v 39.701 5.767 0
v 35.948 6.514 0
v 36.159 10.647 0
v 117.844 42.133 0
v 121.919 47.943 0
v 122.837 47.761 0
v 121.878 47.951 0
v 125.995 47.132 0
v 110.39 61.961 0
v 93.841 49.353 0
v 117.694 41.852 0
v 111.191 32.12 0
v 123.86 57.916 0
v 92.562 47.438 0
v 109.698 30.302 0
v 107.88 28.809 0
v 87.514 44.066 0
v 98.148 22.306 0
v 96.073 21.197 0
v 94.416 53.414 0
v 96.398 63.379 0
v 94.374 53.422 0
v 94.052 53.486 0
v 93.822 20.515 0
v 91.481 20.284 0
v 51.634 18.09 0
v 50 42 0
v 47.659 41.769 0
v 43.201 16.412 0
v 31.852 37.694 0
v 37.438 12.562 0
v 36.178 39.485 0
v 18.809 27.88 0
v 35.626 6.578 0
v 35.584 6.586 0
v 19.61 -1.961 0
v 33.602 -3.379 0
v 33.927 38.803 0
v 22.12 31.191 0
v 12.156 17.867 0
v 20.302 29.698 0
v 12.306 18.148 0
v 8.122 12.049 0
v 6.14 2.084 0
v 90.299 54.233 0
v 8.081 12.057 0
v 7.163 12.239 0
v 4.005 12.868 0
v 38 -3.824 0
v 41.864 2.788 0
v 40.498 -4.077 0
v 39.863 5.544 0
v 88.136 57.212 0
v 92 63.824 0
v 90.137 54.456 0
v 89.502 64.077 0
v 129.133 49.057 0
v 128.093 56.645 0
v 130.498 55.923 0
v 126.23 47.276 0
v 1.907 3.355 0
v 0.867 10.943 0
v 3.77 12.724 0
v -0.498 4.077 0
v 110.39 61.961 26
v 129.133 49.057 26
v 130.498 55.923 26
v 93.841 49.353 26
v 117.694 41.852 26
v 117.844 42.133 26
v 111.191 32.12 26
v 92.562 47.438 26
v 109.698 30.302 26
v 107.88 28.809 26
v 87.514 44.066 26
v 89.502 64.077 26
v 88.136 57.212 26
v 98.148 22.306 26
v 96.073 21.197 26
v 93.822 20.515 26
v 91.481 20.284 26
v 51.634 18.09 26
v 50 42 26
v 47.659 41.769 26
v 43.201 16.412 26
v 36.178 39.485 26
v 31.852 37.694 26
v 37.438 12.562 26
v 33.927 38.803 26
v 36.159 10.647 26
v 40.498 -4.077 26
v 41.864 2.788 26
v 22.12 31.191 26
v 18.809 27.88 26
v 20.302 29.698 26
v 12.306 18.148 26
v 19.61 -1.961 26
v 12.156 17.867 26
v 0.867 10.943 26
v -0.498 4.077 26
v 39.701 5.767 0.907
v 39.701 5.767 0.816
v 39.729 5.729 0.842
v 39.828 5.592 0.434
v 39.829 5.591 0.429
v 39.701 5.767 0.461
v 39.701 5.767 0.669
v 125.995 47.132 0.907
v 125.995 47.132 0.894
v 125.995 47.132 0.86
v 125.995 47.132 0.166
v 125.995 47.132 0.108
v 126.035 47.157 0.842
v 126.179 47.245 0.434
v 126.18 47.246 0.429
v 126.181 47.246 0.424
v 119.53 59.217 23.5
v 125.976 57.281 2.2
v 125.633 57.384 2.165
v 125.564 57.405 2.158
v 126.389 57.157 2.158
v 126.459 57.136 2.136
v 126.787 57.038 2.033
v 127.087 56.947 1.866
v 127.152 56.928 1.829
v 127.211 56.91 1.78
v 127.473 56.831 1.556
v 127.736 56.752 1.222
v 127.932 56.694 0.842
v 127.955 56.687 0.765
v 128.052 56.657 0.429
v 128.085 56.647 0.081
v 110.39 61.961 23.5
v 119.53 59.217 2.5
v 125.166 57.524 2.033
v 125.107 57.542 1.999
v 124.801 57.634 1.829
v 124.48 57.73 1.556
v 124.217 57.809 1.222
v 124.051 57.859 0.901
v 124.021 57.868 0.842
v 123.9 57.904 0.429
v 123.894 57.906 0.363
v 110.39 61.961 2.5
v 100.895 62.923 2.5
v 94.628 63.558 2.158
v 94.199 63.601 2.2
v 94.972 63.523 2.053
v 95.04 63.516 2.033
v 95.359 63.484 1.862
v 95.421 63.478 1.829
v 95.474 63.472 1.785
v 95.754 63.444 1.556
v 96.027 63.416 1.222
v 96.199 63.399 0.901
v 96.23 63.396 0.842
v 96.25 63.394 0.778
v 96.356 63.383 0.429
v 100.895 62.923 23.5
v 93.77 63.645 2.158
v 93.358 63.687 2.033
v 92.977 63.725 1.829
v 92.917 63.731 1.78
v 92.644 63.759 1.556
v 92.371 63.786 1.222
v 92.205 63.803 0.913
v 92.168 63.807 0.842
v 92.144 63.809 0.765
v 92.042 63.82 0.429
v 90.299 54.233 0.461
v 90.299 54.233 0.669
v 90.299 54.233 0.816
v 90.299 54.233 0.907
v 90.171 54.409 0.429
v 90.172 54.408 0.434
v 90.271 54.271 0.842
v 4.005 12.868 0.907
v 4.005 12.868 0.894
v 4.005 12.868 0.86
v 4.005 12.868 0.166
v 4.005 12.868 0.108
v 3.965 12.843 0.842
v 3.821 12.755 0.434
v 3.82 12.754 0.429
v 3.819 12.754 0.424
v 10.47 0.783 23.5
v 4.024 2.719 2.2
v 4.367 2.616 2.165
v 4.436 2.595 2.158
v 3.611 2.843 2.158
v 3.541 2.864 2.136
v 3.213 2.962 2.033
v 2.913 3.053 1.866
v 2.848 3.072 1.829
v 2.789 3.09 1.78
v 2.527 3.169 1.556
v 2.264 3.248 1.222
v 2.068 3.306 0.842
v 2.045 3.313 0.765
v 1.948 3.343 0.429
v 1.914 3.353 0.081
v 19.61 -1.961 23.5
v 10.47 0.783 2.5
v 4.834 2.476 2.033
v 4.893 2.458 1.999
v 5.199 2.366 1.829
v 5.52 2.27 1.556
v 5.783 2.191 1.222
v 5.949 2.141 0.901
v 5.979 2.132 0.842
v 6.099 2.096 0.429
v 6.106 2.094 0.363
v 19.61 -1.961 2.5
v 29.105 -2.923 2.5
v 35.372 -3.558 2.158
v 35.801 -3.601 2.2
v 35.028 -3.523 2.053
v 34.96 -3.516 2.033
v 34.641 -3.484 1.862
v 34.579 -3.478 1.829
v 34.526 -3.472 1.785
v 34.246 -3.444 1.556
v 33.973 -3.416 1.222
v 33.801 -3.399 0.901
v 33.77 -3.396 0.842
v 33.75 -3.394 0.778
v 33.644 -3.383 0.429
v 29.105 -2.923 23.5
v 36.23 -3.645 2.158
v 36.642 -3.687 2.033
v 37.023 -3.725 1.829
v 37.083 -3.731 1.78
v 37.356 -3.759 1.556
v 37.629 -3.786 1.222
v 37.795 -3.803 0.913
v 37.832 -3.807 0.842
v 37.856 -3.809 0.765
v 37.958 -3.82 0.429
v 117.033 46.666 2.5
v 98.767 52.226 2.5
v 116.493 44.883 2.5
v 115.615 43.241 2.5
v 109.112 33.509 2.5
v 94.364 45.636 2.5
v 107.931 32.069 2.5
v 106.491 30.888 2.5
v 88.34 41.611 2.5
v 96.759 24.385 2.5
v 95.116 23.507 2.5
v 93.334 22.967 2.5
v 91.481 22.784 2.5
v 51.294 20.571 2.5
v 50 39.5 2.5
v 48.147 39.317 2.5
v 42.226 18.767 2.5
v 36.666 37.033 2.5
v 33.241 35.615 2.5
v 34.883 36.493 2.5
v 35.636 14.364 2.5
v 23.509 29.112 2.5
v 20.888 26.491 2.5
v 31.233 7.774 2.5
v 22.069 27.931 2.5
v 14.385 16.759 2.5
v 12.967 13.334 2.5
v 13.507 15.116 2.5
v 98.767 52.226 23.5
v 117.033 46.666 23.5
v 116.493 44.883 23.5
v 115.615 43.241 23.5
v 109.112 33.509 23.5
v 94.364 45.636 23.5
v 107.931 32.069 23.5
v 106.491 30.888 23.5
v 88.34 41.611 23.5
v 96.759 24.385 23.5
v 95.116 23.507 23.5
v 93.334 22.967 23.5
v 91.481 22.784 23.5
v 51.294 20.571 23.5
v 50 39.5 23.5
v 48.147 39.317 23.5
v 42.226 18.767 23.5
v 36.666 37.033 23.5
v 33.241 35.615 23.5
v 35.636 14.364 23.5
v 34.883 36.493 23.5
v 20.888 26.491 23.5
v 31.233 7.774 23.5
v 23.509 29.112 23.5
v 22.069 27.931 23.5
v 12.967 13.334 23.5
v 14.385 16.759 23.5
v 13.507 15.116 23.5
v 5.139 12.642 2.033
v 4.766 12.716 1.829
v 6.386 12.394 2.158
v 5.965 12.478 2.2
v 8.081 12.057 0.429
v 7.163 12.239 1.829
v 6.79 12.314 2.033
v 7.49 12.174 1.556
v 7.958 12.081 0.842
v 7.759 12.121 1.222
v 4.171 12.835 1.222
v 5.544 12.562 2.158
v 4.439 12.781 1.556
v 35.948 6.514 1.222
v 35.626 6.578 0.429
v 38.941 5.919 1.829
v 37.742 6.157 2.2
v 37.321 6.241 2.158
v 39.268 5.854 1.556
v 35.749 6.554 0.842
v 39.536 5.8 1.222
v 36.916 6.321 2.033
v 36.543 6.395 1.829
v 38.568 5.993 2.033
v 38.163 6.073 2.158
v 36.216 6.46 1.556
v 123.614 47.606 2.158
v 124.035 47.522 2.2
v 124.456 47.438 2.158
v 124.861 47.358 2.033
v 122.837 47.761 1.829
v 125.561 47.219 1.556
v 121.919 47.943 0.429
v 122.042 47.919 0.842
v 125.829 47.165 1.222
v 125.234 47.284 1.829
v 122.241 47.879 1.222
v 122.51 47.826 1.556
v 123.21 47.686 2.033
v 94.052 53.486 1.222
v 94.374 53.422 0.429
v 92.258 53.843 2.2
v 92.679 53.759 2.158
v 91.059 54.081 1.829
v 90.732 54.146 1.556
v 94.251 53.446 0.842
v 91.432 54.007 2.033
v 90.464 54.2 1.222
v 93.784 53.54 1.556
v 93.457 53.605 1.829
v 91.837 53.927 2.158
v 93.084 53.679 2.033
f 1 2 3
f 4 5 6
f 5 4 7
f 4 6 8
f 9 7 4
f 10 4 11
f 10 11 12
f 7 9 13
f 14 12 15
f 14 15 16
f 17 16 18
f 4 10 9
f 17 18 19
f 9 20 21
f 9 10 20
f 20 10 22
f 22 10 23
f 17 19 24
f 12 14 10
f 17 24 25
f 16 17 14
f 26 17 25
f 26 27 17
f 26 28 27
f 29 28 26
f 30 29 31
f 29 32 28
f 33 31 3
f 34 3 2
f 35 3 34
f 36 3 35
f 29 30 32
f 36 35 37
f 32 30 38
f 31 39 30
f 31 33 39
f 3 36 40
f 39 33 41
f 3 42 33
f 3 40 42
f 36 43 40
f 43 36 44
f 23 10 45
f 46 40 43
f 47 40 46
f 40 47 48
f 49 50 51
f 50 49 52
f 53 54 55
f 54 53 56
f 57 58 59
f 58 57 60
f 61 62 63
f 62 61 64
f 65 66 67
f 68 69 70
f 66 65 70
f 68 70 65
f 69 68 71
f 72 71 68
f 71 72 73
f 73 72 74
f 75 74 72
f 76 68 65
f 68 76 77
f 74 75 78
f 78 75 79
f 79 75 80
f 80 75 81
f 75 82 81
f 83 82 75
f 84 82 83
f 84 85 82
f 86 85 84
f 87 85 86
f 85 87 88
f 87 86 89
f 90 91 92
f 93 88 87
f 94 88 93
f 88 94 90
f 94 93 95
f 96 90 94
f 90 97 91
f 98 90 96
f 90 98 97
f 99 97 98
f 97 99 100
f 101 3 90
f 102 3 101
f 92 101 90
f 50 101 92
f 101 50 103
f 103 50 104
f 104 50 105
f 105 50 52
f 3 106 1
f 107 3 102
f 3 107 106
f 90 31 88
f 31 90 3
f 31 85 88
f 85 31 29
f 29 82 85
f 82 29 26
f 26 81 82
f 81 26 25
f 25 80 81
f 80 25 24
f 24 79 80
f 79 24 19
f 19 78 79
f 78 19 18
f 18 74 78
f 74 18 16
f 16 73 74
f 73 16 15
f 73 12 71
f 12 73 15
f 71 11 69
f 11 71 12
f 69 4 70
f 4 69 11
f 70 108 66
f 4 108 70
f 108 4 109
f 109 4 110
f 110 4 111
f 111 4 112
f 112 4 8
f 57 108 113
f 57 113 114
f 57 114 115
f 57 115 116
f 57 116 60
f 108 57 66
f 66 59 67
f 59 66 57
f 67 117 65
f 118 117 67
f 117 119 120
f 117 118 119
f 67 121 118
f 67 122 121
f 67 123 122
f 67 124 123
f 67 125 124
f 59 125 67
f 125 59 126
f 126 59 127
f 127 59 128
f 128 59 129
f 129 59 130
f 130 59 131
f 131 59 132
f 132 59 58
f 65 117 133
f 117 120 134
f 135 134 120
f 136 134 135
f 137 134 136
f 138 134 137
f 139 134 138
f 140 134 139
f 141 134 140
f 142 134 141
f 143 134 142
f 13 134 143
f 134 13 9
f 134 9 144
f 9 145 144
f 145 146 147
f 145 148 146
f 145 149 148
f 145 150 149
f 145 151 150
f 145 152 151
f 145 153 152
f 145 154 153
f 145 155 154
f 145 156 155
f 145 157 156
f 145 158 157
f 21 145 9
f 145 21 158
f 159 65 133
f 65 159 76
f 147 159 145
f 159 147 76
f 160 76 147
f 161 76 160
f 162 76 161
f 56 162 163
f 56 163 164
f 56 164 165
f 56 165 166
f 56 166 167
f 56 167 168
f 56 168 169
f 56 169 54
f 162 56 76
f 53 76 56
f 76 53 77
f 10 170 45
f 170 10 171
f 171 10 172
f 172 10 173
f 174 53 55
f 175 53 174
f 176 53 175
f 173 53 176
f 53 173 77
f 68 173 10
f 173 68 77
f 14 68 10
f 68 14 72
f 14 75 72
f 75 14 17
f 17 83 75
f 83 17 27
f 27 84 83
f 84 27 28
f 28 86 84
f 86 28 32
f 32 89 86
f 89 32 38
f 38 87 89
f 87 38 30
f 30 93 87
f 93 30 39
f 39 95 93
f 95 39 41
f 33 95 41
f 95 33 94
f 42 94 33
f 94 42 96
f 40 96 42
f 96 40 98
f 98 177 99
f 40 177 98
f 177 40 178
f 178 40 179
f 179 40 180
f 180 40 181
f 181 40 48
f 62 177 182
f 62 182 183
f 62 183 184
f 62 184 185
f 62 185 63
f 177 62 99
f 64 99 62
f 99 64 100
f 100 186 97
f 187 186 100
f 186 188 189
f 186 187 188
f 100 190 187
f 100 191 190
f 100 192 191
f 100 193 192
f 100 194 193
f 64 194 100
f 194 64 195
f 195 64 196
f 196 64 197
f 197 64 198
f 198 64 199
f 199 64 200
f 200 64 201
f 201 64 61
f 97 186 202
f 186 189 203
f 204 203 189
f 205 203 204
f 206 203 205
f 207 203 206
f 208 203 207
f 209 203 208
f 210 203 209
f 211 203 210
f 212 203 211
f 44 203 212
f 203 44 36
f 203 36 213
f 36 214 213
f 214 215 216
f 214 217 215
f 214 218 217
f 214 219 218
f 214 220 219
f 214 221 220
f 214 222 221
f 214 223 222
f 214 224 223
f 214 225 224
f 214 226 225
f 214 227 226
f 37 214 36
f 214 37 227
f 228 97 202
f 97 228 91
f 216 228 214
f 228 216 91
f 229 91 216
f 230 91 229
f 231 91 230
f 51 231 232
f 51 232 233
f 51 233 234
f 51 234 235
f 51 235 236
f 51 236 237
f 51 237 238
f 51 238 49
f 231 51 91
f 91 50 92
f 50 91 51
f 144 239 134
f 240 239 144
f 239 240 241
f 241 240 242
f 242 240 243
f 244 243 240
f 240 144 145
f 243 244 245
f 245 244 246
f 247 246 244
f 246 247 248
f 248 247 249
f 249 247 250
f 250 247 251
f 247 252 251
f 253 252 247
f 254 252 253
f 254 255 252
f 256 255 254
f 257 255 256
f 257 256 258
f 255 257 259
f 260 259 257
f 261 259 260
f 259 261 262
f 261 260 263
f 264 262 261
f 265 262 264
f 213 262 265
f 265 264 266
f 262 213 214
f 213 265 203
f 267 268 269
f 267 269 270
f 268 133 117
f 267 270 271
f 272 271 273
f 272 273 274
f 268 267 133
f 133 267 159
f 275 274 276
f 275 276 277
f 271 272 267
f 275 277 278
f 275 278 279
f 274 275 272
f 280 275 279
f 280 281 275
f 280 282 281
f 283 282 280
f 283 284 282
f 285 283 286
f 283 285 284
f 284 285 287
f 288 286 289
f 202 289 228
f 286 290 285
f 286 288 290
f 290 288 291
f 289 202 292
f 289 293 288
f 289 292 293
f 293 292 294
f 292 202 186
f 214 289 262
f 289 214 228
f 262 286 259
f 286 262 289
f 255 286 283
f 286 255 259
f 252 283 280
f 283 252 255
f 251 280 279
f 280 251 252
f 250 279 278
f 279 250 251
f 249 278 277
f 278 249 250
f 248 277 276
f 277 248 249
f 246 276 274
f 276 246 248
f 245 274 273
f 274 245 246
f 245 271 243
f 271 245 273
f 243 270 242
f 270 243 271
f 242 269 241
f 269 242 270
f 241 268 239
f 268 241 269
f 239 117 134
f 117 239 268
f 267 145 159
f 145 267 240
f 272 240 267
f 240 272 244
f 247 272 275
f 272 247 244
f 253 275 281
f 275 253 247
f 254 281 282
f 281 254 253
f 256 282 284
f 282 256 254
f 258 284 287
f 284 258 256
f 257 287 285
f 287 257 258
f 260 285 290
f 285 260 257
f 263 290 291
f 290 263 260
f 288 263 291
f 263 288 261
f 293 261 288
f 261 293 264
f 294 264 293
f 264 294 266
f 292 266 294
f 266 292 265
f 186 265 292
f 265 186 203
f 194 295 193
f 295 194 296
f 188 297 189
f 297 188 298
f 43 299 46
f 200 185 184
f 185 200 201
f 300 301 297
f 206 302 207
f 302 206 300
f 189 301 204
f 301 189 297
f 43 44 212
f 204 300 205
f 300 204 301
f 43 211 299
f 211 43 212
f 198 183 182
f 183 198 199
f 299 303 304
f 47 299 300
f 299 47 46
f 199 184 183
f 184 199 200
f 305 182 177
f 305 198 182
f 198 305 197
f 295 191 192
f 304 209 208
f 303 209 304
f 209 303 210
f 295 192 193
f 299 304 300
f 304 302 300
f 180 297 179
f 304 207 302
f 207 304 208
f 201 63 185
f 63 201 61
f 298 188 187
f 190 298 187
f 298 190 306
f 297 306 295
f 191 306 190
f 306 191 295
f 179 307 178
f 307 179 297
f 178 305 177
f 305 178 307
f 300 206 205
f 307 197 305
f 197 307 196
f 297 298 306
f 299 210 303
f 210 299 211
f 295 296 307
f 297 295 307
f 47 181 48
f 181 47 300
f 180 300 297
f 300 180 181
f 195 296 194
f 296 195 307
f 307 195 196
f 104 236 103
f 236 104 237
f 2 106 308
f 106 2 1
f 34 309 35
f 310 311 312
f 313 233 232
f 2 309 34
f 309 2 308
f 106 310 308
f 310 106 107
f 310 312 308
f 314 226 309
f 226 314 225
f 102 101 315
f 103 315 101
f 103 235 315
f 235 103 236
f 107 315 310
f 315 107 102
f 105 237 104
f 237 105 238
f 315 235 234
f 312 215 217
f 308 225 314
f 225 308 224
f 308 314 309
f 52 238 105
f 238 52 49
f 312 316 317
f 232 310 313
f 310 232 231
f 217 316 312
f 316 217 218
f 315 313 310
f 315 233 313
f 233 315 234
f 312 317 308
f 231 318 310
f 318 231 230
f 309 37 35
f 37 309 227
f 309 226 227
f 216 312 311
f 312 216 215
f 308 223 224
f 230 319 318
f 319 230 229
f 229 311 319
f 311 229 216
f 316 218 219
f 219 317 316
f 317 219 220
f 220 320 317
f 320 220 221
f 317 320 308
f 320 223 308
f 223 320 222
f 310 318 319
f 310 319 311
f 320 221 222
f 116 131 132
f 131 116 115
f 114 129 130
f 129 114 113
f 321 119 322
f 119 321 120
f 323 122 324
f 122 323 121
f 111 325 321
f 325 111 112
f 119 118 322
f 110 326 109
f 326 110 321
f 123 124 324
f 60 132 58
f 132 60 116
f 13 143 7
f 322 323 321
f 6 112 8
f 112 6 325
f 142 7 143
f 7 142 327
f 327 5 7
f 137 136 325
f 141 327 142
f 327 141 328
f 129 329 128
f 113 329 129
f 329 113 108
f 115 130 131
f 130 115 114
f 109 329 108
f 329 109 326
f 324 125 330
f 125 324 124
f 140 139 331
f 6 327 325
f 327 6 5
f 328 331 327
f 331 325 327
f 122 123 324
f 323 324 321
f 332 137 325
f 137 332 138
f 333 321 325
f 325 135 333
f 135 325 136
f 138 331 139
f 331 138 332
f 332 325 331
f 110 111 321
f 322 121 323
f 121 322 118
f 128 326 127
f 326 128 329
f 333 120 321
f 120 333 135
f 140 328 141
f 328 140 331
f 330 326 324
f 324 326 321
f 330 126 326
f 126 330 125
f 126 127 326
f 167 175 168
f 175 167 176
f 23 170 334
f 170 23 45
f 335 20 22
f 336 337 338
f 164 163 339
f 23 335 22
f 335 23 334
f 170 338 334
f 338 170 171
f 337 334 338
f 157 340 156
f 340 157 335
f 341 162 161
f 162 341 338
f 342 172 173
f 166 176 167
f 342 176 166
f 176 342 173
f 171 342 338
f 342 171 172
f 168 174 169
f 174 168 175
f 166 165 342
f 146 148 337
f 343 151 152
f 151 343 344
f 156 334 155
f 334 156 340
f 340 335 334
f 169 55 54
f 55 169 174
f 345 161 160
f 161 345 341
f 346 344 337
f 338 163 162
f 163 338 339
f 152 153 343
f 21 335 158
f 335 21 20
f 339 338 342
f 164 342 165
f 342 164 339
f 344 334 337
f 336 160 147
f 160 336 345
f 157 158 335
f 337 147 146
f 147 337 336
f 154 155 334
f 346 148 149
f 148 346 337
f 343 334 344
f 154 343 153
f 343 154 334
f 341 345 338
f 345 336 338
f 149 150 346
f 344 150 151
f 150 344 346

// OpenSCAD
$fn = 32;

// ----------------------------------------------------------------------
// Air duct: 24 mm duct, 2.5 mm wall, 26 mm across
// ----------------------------------------------------------------------

// --- parameters (mm) ---
duct_r = 12;              // duct core radius
duct_d = 24;              // duct core diameter
wall = 2.5;               // duct wall thickness
height = 26;              // duct width (extrusion height)
port_r = 20.9;            // port flange half width
port_d = 41.8;            // port flange width
port_t = 7;               // port flange thickness
bolt_d = 4.4;             // port bolt holes
bolt_offset = 16.2;       // bolt hole offset from the port axis

difference() {
  /* outer hull chain: tube with a flat flange plate at every port */
  linear_extrude(height = 26) {
    hull() {
      polygon([[40.498, -4.077], [-0.498, 4.077], [0.867, 10.943], [41.864, 2.788]]);
      translate([21.951, 9.808]) circle(r = 12);
    }
    hull() {
      translate([21.951, 9.808]) circle(r = 12);
      translate([22.284, 11.481]) circle(r = 12);
    }
    hull() {
      translate([22.284, 11.481]) circle(r = 12);
      translate([28.787, 21.213]) circle(r = 12);
    }
    hull() {
      translate([28.787, 21.213]) circle(r = 12);
      translate([38.519, 27.716]) circle(r = 12);
    }
    hull() {
      translate([38.519, 27.716]) circle(r = 12);
      translate([50, 30]) circle(r = 12);
    }
    hull() {
      translate([50, 30]) circle(r = 12);
      translate([91.481, 32.284]) circle(r = 12);
    }
    hull() {
      translate([91.481, 32.284]) circle(r = 12);
      translate([101.213, 38.787]) circle(r = 12);
    }
    hull() {
      translate([101.213, 38.787]) circle(r = 12);
      translate([107.716, 48.519]) circle(r = 12);
    }
    hull() {
      translate([107.716, 48.519]) circle(r = 12);
      translate([108.049, 50.192]) circle(r = 12);
    }
    hull() {
      translate([108.049, 50.192]) circle(r = 12);
      polygon([[89.502, 64.077], [130.498, 55.923], [129.133, 49.057], [88.136, 57.212]]);
    }
  }
  /* air passage: the same chain inset by the wall, 5 mm proud of the ports */
  translate([0, 0, 2.5]) linear_extrude(height = 21) {
    hull() {
      translate([19.025, -4.904]) circle(r = 9.5);
      translate([22.284, 11.481]) circle(r = 9.5);
    }
    hull() {
      translate([22.284, 11.481]) circle(r = 9.5);
      translate([28.787, 21.213]) circle(r = 9.5);
    }
    hull() {
      translate([28.787, 21.213]) circle(r = 9.5);
      translate([38.519, 27.716]) circle(r = 9.5);
    }
    hull() {
      translate([38.519, 27.716]) circle(r = 9.5);
      translate([50, 30]) circle(r = 9.5);
    }
    hull() {
      translate([50, 30]) circle(r = 9.5);
      translate([91.481, 32.284]) circle(r = 9.5);
    }
    hull() {
      translate([91.481, 32.284]) circle(r = 9.5);
      translate([101.213, 38.787]) circle(r = 9.5);
    }
    hull() {
      translate([101.213, 38.787]) circle(r = 9.5);
      translate([107.716, 48.519]) circle(r = 9.5);
    }
    hull() {
      translate([107.716, 48.519]) circle(r = 9.5);
      translate([110.975, 64.904]) circle(r = 9.5);
    }
  }
  translate([20, 0]) rotate([0, 0, -11.25]) translate([-16.2, -2.5]) rotate([-90, 0, 0]) cylinder(h = 12, d = 4.4);
  translate([20, 0]) rotate([0, 0, -11.25]) translate([16.2, -2.5]) rotate([-90, 0, 0]) cylinder(h = 12, d = 4.4);
  translate([110, 60]) rotate([0, 0, 168.75]) translate([-16.2, -2.5]) rotate([-90, 0, 0]) cylinder(h = 12, d = 4.4);
  translate([110, 60]) rotate([0, 0, 168.75]) translate([16.2, -2.5]) rotate([-90, 0, 0]) cylinder(h = 12, d = 4.4);
}
